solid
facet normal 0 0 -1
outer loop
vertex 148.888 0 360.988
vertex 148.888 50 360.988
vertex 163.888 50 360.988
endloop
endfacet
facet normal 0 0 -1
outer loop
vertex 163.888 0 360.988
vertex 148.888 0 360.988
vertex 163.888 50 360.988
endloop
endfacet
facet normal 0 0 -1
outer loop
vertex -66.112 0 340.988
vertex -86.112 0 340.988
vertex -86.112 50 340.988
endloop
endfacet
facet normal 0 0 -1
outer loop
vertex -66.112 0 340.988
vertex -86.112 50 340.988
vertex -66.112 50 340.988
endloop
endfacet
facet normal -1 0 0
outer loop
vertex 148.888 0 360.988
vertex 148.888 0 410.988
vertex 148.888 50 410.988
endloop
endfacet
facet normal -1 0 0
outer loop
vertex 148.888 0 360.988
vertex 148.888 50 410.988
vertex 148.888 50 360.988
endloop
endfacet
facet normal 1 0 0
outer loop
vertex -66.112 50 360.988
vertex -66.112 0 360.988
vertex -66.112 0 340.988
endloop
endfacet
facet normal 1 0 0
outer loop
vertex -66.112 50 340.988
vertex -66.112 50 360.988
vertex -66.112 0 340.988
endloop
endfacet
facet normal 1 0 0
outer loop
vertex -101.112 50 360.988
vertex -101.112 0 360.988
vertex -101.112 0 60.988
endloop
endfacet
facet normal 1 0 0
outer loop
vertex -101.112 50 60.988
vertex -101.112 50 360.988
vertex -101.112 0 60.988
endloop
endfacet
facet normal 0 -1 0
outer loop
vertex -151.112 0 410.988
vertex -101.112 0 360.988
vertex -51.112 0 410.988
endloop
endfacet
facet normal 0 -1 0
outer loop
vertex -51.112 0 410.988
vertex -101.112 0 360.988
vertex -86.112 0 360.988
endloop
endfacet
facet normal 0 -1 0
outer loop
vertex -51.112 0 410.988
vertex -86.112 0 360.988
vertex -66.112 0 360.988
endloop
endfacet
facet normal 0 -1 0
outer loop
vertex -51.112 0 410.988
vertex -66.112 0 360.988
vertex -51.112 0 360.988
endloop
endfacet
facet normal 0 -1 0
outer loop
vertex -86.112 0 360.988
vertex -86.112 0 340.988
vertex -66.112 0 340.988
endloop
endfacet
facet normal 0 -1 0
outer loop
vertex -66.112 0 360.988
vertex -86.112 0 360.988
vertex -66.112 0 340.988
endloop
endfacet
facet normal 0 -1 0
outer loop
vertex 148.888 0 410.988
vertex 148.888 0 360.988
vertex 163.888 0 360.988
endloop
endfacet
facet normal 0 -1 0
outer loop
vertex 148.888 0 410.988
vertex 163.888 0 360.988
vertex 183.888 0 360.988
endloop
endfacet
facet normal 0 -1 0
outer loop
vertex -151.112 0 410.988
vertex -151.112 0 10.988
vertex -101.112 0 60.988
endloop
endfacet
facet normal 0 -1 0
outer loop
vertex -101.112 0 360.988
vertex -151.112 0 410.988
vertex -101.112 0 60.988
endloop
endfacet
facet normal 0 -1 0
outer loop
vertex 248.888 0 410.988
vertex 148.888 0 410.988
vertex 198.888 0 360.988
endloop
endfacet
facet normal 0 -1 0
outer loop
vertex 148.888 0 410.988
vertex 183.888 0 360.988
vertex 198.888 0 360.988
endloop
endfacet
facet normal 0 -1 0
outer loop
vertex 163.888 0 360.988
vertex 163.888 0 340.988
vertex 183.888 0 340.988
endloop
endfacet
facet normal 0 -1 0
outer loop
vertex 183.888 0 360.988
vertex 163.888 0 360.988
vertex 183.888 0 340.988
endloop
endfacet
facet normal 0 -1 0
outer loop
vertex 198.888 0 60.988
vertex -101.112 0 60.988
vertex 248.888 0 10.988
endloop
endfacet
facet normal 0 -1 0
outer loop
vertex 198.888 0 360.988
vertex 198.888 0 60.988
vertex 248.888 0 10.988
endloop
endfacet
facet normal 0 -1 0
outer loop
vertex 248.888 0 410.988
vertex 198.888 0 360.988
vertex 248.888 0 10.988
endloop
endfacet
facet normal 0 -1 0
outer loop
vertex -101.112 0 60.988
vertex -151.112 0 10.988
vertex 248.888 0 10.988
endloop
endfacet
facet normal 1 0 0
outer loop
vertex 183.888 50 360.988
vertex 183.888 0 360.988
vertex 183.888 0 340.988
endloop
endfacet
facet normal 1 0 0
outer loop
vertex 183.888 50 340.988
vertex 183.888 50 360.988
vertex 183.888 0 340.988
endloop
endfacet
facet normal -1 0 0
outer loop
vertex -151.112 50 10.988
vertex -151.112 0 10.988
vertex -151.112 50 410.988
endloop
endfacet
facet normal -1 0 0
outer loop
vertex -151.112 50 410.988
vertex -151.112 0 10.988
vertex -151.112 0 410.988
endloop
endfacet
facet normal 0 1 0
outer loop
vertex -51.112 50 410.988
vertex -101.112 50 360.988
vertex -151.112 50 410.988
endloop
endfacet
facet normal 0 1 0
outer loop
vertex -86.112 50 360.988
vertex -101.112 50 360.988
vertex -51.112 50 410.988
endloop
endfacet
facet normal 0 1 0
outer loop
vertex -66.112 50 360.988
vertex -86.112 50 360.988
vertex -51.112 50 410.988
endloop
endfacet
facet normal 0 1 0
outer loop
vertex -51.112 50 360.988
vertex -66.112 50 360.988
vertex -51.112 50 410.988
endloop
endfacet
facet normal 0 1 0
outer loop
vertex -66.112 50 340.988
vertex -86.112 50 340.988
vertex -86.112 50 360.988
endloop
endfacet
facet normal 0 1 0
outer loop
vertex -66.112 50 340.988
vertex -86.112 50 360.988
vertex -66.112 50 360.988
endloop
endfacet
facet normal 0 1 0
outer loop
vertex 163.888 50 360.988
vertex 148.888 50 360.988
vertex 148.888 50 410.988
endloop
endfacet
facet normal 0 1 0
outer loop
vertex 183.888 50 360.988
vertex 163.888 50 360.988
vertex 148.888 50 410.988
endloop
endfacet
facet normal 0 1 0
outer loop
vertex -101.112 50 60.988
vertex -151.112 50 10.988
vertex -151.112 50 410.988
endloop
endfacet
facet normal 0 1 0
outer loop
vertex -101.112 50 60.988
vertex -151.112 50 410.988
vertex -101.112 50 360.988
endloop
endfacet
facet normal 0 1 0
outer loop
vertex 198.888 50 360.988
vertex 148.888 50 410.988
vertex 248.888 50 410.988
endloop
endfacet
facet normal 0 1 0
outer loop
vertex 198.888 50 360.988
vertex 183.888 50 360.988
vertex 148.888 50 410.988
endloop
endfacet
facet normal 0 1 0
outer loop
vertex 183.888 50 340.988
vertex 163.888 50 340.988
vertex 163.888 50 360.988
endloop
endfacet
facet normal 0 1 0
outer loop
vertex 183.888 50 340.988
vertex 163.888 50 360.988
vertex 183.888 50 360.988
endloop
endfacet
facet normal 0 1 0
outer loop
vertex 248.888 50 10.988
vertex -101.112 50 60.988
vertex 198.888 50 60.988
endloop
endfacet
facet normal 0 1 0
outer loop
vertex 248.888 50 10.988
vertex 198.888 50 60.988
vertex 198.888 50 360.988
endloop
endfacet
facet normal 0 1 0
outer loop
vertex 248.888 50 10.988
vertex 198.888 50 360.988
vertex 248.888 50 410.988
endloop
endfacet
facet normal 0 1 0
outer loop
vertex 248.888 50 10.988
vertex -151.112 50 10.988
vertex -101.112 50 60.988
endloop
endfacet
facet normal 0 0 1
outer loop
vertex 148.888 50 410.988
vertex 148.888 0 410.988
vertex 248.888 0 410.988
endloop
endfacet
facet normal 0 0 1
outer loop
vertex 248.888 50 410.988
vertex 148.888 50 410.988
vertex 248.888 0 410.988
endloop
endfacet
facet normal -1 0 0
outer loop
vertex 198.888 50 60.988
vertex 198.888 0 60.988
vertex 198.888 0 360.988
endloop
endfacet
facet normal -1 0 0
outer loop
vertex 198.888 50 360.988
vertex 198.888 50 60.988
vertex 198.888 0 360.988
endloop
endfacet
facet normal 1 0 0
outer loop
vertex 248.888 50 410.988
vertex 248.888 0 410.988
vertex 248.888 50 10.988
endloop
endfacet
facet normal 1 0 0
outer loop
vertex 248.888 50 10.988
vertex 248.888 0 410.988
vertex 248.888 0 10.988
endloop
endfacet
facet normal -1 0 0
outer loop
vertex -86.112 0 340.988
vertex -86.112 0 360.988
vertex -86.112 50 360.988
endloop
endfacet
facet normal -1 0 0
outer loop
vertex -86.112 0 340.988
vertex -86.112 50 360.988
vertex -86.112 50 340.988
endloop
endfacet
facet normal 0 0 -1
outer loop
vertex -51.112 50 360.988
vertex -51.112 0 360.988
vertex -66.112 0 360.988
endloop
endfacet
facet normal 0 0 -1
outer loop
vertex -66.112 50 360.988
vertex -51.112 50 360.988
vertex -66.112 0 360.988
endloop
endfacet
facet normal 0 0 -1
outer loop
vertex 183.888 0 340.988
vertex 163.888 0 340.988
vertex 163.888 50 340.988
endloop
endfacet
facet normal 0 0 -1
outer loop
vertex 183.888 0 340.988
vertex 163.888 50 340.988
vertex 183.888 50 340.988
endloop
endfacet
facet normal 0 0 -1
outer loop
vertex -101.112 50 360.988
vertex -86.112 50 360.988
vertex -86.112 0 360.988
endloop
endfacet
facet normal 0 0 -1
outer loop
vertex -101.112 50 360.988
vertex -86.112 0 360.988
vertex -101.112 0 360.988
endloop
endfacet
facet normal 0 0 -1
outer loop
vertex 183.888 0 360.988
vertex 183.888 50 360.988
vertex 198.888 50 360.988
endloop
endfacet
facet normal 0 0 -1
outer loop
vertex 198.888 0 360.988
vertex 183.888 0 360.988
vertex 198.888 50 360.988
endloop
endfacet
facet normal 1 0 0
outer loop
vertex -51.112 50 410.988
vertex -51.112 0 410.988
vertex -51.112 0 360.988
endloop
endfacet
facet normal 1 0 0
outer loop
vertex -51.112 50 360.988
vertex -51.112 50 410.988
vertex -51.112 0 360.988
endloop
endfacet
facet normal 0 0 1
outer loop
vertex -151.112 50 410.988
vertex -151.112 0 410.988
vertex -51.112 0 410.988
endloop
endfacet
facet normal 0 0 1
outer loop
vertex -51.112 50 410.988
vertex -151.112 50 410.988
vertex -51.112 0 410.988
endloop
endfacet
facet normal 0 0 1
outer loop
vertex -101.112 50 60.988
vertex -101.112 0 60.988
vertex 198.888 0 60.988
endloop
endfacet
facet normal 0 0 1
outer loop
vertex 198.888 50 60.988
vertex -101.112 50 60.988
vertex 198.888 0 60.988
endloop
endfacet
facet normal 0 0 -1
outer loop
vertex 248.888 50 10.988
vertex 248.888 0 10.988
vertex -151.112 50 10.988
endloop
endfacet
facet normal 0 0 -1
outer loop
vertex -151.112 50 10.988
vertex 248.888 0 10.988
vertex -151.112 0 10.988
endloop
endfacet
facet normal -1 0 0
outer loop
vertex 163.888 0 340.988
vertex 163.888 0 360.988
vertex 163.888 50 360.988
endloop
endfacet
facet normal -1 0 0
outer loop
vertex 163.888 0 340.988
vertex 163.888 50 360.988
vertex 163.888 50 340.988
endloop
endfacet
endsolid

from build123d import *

# Parameters (mm, degrees)
SKETCH1_W           = 50
SKETCH1_H           = 50
SKETCH1_W_2         = 20
SKETCH1_H_2         = 20
BOSS_EXTRUDE1_DEPTH = 50


with BuildPart() as part:
    # Sketch1 → Boss-Extrude1 (new body)
    with BuildSketch(Plane(origin=(0, 0, 0), x_dir=(1, 0, 0), z_dir=(0, 1, 0))):
        Polygon((-98.419958922, -10.98752745), (-151.112267161, -10.98752745), (-151.112267161, -219.278466068), (-151.112267161, -380.152018312), (-151.112267161, -410.98752745), (-101.112267161, -410.98752745), (-101.112267161, -360.98752745), (-101.112267161, -60.98752745), (198.887732839, -60.98752745), (198.887732839, -360.98752745), (198.887732839, -410.98752745), (248.887732839, -410.98752745), (248.887732839, -380.152018312), (248.887732839, -219.278466068), (248.887732839, -10.98752745), (169.957323972, -10.98752745), align=None)
        with Locations((173.887732839, -385.98752745)):
            Rectangle(SKETCH1_W, SKETCH1_H)
        Polygon((-101.112267161, -360.98752745), (-101.112267161, -410.98752745), (-51.112267161, -410.98752745), (-51.112267161, -360.98752745), (-66.112267161, -360.98752745), (-86.112267161, -360.98752745), align=None)
        with Locations((-76.112267161, -350.98752745)):
            Rectangle(SKETCH1_W_2, SKETCH1_H_2)
        with Locations((173.887732839, -350.98752745)):
            Rectangle(SKETCH1_W_2, SKETCH1_H_2)
    extrude(amount=BOSS_EXTRUDE1_DEPTH)


solid = part.part
